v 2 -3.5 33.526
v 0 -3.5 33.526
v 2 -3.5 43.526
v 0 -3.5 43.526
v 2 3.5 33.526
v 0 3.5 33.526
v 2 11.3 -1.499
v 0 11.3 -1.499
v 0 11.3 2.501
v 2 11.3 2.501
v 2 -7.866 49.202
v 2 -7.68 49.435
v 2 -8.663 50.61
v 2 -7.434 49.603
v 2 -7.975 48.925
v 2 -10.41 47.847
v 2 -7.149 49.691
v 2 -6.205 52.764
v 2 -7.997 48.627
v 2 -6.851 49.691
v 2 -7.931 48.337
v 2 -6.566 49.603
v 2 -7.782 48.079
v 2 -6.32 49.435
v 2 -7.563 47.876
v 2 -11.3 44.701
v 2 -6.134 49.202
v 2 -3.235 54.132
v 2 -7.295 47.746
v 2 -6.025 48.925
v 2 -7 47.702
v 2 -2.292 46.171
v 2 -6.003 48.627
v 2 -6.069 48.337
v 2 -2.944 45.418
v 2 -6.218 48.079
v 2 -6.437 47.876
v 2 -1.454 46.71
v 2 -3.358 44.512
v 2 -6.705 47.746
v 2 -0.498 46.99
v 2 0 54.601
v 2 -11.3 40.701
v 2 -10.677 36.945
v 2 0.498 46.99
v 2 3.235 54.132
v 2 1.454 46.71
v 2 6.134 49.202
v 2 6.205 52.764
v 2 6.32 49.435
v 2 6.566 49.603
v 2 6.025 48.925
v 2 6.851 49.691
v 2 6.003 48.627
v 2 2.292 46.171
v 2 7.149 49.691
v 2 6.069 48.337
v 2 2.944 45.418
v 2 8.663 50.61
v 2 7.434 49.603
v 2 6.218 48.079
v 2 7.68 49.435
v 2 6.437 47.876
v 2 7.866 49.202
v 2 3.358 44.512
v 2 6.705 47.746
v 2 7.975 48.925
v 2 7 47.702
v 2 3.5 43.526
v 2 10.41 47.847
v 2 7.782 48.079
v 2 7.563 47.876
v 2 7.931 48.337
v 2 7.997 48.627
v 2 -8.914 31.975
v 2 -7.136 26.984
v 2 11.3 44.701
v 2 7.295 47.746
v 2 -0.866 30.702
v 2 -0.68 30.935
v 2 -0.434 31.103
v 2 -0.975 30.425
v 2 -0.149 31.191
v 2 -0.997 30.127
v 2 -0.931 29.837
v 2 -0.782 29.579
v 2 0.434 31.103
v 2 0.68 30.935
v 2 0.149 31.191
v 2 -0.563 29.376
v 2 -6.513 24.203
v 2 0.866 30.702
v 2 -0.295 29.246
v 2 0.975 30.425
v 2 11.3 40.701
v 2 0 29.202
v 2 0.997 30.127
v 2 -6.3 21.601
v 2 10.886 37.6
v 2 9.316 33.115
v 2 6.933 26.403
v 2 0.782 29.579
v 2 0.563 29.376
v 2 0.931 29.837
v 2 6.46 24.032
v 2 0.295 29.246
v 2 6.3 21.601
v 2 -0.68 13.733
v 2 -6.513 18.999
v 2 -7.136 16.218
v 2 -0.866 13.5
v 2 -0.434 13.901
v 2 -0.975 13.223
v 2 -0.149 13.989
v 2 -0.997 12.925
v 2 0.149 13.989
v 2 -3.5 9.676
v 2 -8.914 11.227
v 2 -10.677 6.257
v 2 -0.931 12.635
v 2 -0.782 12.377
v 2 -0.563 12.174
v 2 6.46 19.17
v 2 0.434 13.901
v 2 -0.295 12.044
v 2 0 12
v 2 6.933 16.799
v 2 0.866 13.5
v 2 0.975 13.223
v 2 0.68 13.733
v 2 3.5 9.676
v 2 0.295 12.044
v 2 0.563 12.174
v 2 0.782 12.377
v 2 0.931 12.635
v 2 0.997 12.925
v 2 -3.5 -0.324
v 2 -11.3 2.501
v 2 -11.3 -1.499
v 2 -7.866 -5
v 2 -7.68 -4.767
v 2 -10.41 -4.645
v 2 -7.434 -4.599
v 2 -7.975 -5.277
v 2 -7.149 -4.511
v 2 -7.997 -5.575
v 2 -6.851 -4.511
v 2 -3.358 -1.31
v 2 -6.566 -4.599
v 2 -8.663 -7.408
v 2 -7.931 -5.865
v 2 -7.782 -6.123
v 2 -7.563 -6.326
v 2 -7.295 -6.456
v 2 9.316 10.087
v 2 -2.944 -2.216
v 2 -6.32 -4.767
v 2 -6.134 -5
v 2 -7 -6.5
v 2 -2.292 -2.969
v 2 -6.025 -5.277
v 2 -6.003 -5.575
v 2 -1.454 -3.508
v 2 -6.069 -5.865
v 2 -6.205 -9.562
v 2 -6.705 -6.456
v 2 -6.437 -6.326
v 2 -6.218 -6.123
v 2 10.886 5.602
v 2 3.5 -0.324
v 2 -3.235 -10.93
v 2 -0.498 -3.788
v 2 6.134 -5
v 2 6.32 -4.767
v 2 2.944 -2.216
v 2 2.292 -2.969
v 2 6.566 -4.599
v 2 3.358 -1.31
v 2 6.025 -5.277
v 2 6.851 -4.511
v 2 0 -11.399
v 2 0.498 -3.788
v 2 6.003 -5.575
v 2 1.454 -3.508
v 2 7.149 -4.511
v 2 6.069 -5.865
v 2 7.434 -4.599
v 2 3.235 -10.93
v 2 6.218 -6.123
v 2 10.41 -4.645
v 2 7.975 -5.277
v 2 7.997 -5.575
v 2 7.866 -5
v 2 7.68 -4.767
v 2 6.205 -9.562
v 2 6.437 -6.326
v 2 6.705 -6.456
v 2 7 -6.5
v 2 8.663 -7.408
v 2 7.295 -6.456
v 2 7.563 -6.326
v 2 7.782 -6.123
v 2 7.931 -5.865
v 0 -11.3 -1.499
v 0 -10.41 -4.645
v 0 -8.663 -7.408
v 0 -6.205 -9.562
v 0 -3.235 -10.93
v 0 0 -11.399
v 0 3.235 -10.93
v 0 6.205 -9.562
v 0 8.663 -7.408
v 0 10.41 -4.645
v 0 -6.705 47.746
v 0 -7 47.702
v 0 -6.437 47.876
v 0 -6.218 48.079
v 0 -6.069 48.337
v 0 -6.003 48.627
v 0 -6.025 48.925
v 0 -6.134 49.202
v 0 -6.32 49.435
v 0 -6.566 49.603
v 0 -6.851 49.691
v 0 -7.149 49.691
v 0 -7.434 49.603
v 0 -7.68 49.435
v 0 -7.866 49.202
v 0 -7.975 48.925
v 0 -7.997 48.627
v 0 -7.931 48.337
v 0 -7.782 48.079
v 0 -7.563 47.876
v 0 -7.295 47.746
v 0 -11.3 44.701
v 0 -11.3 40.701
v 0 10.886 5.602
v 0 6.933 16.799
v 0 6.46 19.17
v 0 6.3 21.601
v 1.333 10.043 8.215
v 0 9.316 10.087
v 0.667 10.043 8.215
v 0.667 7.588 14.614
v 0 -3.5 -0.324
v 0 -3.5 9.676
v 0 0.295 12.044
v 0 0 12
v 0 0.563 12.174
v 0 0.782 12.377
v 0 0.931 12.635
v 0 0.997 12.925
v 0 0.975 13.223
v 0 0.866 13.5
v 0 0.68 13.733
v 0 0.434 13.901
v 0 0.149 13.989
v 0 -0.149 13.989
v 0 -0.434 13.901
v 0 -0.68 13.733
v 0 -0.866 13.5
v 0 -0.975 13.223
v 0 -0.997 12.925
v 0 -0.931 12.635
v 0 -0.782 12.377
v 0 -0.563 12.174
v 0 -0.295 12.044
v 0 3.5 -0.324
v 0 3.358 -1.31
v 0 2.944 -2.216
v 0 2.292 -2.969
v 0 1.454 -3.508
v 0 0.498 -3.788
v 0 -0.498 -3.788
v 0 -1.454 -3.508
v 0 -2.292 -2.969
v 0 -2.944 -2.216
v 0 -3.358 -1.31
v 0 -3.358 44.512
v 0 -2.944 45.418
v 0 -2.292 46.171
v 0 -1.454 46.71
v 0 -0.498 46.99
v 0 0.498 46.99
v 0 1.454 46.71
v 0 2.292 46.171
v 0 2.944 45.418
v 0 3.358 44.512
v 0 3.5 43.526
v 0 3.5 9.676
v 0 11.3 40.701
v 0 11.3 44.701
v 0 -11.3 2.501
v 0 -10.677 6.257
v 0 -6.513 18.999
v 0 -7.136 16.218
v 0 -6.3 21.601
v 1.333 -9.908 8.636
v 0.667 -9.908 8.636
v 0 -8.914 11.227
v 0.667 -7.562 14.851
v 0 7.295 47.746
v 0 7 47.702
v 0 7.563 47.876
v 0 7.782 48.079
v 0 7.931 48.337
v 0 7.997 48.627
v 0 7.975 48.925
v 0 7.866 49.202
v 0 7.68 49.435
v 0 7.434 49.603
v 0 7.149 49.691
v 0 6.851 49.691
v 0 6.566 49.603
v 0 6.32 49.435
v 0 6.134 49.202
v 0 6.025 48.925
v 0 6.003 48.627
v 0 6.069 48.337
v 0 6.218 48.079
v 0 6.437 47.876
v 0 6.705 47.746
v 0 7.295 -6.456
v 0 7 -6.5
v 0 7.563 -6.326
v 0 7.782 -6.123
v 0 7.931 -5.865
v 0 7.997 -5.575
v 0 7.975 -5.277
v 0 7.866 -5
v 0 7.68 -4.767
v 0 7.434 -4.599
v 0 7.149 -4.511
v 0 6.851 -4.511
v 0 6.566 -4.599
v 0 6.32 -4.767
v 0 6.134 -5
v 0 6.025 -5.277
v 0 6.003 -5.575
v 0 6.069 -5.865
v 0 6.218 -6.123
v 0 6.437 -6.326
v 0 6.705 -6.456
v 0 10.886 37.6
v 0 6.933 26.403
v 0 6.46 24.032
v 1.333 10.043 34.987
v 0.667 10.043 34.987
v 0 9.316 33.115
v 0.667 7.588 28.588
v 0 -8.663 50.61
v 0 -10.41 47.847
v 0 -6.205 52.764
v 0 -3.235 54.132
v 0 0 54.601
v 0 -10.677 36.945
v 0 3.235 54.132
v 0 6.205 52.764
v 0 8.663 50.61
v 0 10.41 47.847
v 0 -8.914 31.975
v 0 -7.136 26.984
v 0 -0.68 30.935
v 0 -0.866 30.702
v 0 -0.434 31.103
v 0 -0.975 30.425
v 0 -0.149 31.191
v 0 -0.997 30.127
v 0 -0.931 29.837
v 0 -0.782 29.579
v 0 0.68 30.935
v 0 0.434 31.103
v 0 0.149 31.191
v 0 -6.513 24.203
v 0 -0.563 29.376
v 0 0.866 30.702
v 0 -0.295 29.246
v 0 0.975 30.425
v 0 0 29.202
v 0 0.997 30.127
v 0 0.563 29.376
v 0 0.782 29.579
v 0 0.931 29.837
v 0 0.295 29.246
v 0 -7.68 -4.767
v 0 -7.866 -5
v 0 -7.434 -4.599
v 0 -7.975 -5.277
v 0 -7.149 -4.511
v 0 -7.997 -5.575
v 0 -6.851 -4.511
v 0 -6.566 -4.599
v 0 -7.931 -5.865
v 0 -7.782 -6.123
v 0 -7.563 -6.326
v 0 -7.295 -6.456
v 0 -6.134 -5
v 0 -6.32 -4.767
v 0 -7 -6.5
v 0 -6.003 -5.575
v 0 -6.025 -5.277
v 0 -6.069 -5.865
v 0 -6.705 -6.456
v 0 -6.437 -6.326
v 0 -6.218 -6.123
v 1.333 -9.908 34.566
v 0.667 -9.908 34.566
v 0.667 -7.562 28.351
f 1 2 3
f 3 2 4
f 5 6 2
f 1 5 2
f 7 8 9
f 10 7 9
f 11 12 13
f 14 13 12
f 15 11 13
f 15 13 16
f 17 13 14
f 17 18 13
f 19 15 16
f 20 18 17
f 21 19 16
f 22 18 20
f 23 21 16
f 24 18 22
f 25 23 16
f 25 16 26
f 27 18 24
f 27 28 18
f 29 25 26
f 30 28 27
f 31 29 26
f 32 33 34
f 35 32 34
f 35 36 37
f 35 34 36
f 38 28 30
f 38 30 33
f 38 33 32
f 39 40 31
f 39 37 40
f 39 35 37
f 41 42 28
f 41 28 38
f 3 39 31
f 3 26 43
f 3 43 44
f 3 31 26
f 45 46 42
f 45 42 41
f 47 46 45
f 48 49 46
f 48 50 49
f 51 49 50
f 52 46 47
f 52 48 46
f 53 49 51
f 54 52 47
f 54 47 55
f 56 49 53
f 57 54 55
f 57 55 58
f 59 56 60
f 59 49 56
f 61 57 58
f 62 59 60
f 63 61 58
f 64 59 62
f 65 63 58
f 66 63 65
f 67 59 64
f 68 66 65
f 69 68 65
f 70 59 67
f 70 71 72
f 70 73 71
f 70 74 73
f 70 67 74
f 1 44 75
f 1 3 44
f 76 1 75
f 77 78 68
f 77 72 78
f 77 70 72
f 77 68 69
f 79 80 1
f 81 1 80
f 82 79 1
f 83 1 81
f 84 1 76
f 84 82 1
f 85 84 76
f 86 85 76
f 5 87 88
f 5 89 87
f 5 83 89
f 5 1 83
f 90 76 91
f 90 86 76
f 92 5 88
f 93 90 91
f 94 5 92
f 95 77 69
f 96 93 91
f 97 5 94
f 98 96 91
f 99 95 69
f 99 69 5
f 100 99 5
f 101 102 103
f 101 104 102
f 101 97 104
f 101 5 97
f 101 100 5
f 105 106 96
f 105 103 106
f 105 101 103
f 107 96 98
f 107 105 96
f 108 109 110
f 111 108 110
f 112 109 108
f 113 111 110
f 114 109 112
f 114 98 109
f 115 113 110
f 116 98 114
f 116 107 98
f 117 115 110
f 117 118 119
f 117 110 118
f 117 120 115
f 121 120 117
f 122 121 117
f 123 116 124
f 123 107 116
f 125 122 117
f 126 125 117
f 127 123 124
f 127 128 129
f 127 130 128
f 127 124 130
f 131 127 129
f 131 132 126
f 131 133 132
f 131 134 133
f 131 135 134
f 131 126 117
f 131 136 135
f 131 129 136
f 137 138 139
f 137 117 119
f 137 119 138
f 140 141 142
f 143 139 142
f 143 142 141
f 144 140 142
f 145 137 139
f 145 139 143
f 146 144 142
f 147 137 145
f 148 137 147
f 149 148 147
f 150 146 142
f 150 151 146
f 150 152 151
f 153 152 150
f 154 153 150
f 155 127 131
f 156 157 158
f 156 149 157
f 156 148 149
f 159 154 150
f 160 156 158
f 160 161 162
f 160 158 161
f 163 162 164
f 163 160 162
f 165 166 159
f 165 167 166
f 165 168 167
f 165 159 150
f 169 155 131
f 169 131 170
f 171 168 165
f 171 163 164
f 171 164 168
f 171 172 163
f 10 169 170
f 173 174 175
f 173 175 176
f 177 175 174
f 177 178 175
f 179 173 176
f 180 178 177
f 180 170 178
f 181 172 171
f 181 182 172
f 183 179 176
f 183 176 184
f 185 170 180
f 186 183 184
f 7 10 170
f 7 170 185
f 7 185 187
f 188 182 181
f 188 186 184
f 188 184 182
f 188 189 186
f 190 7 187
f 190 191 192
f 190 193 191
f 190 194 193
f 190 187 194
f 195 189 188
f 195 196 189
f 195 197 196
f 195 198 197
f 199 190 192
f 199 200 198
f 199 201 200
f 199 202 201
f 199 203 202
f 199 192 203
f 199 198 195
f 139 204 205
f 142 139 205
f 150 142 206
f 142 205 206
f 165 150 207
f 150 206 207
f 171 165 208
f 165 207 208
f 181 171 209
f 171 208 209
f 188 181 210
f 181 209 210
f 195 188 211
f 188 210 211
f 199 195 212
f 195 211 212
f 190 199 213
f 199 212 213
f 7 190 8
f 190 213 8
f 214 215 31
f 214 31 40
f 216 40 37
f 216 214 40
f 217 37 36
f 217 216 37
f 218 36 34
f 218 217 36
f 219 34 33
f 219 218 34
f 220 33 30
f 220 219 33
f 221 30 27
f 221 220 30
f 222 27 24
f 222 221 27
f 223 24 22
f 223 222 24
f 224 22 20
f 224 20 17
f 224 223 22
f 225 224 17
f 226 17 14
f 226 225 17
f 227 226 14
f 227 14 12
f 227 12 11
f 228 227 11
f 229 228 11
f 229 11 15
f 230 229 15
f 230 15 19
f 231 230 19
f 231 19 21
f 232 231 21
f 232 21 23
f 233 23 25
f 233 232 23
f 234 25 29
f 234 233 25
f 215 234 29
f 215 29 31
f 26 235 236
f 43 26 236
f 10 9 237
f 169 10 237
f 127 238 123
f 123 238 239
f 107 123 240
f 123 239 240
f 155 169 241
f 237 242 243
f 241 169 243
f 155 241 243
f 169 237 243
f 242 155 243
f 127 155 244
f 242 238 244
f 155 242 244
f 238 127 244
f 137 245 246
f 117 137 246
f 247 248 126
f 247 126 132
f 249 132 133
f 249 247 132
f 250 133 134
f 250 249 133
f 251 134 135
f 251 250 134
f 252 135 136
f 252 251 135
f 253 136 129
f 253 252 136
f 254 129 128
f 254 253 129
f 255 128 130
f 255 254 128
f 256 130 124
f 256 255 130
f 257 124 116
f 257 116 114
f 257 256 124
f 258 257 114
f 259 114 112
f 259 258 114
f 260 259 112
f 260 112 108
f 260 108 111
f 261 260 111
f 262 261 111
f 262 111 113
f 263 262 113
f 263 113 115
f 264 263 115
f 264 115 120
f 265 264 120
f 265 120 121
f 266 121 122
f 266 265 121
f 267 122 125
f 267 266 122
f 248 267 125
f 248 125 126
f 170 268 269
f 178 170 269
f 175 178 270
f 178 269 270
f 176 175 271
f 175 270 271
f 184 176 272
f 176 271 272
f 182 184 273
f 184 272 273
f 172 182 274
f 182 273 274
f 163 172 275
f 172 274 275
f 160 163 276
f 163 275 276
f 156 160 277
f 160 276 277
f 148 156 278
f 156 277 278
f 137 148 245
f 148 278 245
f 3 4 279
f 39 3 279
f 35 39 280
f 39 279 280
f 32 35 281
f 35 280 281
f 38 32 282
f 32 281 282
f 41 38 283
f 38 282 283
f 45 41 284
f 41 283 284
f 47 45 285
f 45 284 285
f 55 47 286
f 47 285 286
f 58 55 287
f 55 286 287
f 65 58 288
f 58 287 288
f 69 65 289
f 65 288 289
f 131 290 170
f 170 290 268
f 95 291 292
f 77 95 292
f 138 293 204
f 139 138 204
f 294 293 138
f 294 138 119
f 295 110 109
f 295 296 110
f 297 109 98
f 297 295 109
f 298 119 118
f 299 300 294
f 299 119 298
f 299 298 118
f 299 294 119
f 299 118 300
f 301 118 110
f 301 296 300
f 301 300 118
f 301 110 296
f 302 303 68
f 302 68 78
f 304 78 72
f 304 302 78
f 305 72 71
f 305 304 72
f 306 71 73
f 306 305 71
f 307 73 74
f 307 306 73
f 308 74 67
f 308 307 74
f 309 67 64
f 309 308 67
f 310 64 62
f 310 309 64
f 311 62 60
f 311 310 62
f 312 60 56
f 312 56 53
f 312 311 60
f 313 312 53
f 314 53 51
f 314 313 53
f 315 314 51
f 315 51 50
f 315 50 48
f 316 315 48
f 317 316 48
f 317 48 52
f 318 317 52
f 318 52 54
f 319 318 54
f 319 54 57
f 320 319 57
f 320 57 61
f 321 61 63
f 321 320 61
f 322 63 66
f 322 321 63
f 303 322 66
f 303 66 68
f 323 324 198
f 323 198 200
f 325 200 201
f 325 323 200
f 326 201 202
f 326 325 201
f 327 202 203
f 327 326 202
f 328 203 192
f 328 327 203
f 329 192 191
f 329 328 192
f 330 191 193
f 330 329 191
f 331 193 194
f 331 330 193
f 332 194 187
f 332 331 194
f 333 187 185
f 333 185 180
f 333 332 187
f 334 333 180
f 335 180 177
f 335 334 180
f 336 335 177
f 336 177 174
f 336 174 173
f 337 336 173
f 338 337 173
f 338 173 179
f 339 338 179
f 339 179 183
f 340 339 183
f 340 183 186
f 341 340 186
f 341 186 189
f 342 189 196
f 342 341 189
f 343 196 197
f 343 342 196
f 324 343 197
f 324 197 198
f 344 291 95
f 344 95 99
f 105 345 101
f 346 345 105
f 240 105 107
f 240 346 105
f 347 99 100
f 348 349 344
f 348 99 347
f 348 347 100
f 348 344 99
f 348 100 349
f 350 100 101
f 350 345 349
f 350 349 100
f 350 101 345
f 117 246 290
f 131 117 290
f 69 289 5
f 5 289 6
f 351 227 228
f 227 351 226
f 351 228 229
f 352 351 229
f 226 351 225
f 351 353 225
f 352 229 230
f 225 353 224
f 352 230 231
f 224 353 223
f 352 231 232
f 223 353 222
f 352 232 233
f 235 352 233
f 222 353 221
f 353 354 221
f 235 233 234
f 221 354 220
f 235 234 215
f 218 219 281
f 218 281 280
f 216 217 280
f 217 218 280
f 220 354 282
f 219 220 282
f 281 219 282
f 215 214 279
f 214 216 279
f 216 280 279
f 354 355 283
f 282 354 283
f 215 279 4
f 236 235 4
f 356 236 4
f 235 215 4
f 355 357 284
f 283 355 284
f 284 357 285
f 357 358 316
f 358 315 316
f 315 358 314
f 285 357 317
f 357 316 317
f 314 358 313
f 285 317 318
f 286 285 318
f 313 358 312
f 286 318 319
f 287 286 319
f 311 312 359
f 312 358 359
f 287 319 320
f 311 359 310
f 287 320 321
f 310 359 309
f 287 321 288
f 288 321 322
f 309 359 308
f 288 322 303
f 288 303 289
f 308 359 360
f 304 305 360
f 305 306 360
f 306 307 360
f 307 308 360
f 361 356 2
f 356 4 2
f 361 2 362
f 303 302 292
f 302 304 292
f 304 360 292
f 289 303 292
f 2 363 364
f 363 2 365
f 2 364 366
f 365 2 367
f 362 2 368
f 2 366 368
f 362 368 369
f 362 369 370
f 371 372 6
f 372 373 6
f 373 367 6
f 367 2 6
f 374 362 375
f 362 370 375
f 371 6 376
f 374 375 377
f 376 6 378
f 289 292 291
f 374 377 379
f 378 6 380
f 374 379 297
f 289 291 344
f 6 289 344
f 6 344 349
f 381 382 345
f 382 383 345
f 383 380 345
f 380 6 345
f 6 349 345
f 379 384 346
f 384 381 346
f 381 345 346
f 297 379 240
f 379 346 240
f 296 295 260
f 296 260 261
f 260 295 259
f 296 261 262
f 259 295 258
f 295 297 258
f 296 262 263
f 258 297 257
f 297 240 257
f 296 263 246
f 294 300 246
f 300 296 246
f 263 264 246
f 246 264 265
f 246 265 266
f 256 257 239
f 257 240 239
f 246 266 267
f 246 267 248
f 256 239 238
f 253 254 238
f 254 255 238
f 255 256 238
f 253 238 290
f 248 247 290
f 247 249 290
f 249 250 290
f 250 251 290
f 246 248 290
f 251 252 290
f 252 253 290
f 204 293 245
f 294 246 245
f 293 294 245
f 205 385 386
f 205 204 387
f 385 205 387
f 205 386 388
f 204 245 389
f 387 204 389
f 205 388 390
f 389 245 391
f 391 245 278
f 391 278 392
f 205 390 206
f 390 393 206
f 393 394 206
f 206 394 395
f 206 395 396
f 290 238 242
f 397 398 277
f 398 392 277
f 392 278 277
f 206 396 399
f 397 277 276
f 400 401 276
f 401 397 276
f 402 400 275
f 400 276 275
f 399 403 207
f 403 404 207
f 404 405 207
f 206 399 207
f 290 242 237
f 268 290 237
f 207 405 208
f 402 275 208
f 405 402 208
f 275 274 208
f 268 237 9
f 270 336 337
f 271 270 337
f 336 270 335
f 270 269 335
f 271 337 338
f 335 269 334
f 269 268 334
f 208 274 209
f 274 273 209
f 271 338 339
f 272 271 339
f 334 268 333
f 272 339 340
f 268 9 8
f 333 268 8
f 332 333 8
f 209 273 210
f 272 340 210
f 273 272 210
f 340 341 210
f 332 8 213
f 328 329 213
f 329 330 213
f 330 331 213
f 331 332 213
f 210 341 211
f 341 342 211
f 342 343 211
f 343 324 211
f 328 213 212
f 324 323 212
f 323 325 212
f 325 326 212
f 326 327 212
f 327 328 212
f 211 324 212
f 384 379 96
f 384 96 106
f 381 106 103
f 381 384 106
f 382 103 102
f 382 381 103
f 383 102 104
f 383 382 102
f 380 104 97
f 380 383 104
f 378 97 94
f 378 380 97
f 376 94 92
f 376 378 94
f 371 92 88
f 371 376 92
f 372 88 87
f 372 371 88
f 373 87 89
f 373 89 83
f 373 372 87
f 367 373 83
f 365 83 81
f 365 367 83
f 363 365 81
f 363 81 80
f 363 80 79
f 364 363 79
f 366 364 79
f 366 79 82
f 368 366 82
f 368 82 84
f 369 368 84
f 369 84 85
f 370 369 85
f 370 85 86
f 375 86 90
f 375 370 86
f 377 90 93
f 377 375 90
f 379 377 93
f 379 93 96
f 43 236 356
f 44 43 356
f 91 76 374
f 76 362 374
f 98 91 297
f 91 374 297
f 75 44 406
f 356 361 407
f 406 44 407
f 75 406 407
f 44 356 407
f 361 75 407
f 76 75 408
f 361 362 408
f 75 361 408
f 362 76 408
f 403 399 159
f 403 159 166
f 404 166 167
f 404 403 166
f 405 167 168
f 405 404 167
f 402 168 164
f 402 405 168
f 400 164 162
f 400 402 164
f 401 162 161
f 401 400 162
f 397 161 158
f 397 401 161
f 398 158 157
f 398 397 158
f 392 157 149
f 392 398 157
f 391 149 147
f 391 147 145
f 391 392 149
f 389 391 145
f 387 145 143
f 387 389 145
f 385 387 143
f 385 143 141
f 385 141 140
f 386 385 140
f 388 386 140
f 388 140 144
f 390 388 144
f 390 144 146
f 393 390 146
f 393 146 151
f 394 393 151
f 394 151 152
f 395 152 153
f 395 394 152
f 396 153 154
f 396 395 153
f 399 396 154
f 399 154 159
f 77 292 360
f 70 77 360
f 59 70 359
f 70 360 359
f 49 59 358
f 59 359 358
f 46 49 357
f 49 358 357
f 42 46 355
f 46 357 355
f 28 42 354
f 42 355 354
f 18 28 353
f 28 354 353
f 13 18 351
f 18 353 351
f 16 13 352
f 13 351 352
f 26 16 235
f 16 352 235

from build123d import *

# Parameters (mm, degrees)
SCHIZZO1_R                   = 1
ESTRUSIONE_ESTRUSIONE1_DEPTH = 2


with BuildPart() as part:
    # Schizzo1 → Estrusione-Estrusione1 (new body)
    with BuildSketch(Plane(origin=(0, 0, 0), x_dir=(0, 0, -1), z_dir=(1, 0, 0))):
        with BuildLine():
            Line((-2.501010101, -11.3), (1.498989899, -11.3))
            ThreePointArc((1.498989899, -11.3), (11.398989899, 0), (1.498989899, 11.3))
            Line((1.498989899, 11.3), (-2.501010101, 11.3))
            add(Edge.make_bspline(
                [(-2.501010101, 11.3), (-7.839898951, 11.429610053), (-14.35178918, 6.216652626), (-21.601010101, 6.3)],
                knots=[0, 0, 0, 0, 1, 1, 1, 1], degree=3))
            add(Edge.make_bspline(
                [(-40.701010101, 11.3), (-35.362121251, 11.429610053), (-28.850231022, 6.216652626), (-21.601010101, 6.3)],
                knots=[0, 0, 0, 0, 1, 1, 1, 1], degree=3))
            Line((-40.701010101, 11.3), (-44.701010101, 11.3))
            ThreePointArc((-44.701010101, 11.3), (-54.601010101, 0), (-44.701010101, -11.3))
            Line((-44.701010101, -11.3), (-40.701010101, -11.3))
            add(Edge.make_bspline(
                [(-40.701010101, -11.3), (-34.455779635, -11.063584615), (-28.769360616, -6.33994929), (-21.601010101, -6.3)],
                knots=[0, 0, 0, 0, 1, 1, 1, 1], degree=3))
            add(Edge.make_bspline(
                [(-2.501010101, -11.3), (-8.746240567, -11.063584615), (-14.432659586, -6.33994929), (-21.601010101, -6.3)],
                knots=[0, 0, 0, 0, 1, 1, 1, 1], degree=3))
        make_face()
        with Locations((-48.702020202, 7)):
            Circle(SCHIZZO1_R, mode=Mode.SUBTRACT)
        with Locations((-48.702020202, -7)):
            Circle(SCHIZZO1_R, mode=Mode.SUBTRACT)
        with Locations((-30.202020202, 0)):
            Circle(SCHIZZO1_R, mode=Mode.SUBTRACT)
        with Locations((-13, 0)):
            Circle(SCHIZZO1_R, mode=Mode.SUBTRACT)
        with Locations((5.5, 7)):
            Circle(SCHIZZO1_R, mode=Mode.SUBTRACT)
        with Locations((5.5, -7)):
            Circle(SCHIZZO1_R, mode=Mode.SUBTRACT)
        with BuildLine():
            Line((-9.676010101, 3.5), (0.323989899, 3.5))
            ThreePointArc((0.323989899, 3.5), (3.823989899, 0), (0.323989899, -3.5))
            Line((0.323989899, -3.5), (-9.676010101, -3.5))
            Line((-9.676010101, -3.5), (-9.676010101, 3.5))
        make_face(mode=Mode.SUBTRACT)
        with BuildLine():
            Line((-33.526010101, -3.5), (-43.526010101, -3.5))
            ThreePointArc((-43.526010101, -3.5), (-47.026010101, 0), (-43.526010101, 3.5))
            Line((-43.526010101, 3.5), (-33.526010101, 3.5))
            Line((-33.526010101, 3.5), (-33.526010101, -3.5))
        make_face(mode=Mode.SUBTRACT)
    extrude(amount=ESTRUSIONE_ESTRUSIONE1_DEPTH)


solid = part.part
